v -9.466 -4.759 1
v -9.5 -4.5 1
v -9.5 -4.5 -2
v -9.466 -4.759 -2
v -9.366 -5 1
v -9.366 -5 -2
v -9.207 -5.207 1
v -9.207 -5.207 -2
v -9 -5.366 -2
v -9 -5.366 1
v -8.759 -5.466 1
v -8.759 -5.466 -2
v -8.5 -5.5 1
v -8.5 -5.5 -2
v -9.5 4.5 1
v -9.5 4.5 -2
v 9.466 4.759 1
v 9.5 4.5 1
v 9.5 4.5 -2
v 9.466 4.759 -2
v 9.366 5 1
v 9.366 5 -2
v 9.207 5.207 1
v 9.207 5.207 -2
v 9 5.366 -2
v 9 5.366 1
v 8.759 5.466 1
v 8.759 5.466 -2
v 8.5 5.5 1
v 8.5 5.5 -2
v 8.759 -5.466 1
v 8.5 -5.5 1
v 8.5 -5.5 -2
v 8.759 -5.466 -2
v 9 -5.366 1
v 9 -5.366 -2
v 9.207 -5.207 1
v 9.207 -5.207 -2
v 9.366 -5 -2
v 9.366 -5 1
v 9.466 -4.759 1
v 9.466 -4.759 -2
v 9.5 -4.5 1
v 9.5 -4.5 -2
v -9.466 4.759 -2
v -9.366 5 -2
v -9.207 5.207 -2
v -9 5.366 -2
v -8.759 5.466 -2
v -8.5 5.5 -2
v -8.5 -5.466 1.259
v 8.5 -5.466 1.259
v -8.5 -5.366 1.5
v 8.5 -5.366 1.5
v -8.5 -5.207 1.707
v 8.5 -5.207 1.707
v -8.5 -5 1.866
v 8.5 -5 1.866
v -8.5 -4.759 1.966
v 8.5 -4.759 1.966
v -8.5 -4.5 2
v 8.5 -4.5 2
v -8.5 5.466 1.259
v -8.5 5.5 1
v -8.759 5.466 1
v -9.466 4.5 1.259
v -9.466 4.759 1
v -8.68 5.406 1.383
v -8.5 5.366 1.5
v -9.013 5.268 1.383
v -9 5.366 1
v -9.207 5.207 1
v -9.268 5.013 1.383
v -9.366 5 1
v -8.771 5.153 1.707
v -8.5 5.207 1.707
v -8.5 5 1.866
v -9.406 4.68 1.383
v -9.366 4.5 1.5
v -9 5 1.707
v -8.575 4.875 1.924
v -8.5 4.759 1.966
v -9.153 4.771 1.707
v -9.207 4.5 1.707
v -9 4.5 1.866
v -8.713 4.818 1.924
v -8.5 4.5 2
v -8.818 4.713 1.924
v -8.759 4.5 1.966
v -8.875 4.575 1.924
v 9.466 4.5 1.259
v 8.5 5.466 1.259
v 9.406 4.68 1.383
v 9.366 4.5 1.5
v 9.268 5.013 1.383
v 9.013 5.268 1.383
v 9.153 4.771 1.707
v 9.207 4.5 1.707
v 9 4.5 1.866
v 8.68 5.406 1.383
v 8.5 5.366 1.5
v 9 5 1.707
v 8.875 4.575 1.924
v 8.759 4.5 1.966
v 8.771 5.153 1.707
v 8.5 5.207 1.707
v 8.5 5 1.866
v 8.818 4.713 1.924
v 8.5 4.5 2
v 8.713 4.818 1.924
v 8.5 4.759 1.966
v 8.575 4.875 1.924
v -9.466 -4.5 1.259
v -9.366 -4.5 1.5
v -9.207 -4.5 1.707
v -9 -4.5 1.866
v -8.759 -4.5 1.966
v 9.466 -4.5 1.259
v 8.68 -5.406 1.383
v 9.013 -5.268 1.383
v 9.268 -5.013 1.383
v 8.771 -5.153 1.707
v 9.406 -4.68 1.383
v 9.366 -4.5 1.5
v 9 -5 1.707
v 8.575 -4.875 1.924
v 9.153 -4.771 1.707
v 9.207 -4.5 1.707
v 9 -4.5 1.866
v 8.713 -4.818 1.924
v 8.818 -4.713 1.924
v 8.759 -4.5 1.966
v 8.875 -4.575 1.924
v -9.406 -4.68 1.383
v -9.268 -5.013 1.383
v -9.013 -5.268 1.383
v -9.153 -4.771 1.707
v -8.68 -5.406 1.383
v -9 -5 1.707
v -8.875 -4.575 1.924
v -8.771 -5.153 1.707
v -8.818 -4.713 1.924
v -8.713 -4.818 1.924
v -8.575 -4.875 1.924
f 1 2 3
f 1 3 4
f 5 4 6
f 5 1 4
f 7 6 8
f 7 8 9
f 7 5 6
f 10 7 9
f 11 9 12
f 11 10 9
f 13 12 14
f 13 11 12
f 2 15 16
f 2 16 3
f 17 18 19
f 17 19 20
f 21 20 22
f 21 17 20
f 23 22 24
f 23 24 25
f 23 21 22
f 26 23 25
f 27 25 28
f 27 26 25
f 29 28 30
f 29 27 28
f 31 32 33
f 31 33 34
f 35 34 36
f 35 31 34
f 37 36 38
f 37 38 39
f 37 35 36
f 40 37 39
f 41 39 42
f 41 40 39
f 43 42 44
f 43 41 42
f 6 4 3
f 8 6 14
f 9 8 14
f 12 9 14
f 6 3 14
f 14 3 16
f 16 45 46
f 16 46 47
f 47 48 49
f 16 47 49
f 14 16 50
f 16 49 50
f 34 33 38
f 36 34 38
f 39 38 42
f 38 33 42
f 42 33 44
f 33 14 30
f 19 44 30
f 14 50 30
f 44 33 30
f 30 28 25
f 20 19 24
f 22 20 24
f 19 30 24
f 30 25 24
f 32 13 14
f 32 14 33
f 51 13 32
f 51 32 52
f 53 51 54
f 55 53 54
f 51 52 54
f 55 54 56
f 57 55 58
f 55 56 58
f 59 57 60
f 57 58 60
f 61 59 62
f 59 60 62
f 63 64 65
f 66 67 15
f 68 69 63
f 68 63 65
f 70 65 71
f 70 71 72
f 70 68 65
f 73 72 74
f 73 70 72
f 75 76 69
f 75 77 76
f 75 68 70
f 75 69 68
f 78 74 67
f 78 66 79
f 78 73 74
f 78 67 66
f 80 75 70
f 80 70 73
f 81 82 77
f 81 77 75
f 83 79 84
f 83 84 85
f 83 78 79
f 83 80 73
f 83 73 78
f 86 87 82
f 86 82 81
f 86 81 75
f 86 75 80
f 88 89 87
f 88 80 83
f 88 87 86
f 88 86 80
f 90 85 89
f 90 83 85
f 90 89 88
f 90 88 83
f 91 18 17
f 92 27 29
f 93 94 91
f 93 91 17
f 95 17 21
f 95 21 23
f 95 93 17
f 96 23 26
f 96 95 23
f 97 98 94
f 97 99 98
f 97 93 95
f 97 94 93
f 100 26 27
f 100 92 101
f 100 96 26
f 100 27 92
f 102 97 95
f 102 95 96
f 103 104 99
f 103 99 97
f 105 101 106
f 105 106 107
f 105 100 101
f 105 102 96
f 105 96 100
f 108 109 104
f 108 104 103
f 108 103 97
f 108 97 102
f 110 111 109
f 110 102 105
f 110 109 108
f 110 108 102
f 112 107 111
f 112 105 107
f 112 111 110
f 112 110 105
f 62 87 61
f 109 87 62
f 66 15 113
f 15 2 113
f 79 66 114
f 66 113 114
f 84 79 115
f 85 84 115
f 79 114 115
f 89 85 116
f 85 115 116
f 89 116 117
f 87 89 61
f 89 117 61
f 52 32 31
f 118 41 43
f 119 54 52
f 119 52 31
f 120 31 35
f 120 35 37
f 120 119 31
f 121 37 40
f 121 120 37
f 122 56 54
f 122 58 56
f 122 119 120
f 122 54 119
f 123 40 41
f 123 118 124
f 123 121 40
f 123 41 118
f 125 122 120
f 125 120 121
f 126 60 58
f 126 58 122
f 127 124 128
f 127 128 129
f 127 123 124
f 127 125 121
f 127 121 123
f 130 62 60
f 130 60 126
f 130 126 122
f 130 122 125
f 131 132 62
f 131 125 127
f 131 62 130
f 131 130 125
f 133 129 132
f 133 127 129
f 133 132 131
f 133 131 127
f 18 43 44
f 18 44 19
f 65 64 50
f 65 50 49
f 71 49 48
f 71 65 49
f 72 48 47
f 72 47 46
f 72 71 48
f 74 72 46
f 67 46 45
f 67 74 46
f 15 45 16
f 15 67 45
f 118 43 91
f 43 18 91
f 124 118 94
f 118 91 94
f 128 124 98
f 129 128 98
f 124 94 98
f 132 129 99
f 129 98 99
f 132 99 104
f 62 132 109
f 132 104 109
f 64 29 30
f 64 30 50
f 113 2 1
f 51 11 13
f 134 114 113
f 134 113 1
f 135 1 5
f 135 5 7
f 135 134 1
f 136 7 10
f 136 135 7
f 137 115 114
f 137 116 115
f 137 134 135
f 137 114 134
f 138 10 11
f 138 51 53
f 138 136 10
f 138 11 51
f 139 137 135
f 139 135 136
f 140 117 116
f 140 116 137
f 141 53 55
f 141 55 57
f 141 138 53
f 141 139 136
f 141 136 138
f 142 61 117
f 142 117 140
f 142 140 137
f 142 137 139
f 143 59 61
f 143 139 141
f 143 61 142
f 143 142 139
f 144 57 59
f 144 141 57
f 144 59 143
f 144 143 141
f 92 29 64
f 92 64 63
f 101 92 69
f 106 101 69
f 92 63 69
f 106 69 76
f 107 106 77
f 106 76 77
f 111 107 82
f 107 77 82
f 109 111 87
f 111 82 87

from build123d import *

# Parameters (mm, degrees)
F1_DEPTH = 2
F2_R     = 1


with BuildPart() as f1:
    # F0 (on Top) → F1 (new body, symmetric)
    with BuildSketch(Plane.XY):
        with BuildLine():
            ThreePointArc((9.5, 4.5), (9.2071067812, 5.2071067812), (8.5, 5.5))
            Line((8.5, 5.5), (-8.5, 5.5))
            ThreePointArc((-8.5, 5.5), (-9.2071067812, 5.2071067812), (-9.5, 4.5))
            Line((-9.5, 4.5), (-9.5, -4.5))
            ThreePointArc((-9.5, -4.5), (-9.2071067812, -5.2071067812), (-8.5, -5.5))
            Line((-8.5, -5.5), (8.5, -5.5))
            ThreePointArc((8.5, -5.5), (9.2071067812, -5.2071067812), (9.5, -4.5))
            Line((9.5, -4.5), (9.5, 4.5))
        make_face()
    extrude(amount=F1_DEPTH, both=True)

    # F2
    f2_edges = [f1.edges().sort_by_distance(p)[0] for p in [
        (0, -5.5, 2),
    ]]
    fillet(f2_edges, radius=F2_R)


solid = f1.part
